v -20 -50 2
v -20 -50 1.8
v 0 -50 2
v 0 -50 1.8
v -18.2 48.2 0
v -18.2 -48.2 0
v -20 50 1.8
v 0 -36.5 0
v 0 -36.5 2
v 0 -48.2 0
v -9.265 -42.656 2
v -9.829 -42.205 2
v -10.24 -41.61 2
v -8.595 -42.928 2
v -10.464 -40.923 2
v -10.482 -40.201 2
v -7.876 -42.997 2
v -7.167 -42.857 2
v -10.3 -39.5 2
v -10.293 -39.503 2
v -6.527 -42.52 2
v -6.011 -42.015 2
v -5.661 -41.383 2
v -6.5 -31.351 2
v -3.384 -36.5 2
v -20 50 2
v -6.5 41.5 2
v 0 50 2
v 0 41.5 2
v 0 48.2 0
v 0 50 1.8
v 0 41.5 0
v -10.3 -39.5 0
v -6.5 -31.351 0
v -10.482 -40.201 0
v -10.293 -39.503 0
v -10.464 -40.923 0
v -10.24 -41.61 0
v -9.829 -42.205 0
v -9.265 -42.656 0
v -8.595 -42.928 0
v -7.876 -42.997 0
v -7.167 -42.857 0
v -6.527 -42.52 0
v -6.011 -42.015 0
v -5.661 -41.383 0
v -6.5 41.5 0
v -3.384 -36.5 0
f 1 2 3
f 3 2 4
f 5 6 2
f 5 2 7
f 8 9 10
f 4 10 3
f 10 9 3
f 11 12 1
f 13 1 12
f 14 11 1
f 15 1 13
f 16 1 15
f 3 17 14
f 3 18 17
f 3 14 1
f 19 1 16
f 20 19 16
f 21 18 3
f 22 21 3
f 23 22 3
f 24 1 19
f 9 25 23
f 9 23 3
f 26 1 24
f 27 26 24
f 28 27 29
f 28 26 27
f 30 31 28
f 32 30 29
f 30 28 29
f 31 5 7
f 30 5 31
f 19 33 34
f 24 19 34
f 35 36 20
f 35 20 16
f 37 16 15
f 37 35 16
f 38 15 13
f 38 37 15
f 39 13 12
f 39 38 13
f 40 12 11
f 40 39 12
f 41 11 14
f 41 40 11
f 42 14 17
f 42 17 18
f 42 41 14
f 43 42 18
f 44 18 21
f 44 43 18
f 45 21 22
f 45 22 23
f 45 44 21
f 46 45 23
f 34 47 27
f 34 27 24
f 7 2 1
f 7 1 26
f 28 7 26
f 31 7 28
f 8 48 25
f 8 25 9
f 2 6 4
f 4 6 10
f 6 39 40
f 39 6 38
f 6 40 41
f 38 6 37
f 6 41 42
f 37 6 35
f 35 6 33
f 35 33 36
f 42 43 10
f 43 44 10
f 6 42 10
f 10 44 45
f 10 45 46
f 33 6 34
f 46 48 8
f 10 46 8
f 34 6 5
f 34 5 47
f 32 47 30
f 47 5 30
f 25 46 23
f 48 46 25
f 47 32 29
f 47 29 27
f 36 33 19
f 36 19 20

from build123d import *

# Parameters (mm, degrees)
SKETCH_W     = 40
SKETCH_H     = 100
SKETCH_R     = 2.5
PAD_DEPTH    = 2
CHAMFER_SIZE = 1.8
BOX_W        = 22
BOX_H        = 119
BOX_DEPTH    = 7
BOX001_W     = 5
BOX001_H     = 9
BOX001_DEPTH = 2


with BuildPart() as part:
    # Sketch → Pad (new body)
    with BuildSketch(Plane.XY):
        Rectangle(SKETCH_W, SKETCH_H)
        with Locations((-8, -40.5)):
            Circle(SKETCH_R, mode=Mode.SUBTRACT)
        with Locations((8, 40.5)):
            Circle(SKETCH_R, mode=Mode.SUBTRACT)
        Polygon((6.5, -41.5), (6.5, 36.5), (0, 36.5), (0, 41.5), (-6.5, 41.5), (-6.5, -36.5), (0, -36.5), (0, -41.5), align=None, mode=Mode.SUBTRACT)
    extrude(amount=PAD_DEPTH)

    # Chamfer
    chamfer_edges = [part.edges().sort_by_distance(p)[0] for p in [
        (-20, 0, 0),
        (0, -50, 0),
        (20, 0, 0),
        (0, 50, 0),
    ]]
    chamfer(chamfer_edges, length=CHAMFER_SIZE)

    # Box → Box (cut)
    with BuildSketch(Plane(origin=(0, 58, 4), x_dir=(1, 0, 0), z_dir=(0, 0, -1))):
        with Locations((11, 59.5)):
            Rectangle(BOX_W, BOX_H)
    extrude(amount=BOX_DEPTH, mode=Mode.SUBTRACT)

    # Box001 → Box001 (cut)
    with BuildSketch(Plane(origin=(-10.3, -39.5, 0), x_dir=(0.906308, -0.422618, 0), z_dir=(0, 0, 1))):
        with Locations((2.5, 4.5)):
            Rectangle(BOX001_W, BOX001_H)
    extrude(amount=BOX001_DEPTH, mode=Mode.SUBTRACT)


solid = part.part
